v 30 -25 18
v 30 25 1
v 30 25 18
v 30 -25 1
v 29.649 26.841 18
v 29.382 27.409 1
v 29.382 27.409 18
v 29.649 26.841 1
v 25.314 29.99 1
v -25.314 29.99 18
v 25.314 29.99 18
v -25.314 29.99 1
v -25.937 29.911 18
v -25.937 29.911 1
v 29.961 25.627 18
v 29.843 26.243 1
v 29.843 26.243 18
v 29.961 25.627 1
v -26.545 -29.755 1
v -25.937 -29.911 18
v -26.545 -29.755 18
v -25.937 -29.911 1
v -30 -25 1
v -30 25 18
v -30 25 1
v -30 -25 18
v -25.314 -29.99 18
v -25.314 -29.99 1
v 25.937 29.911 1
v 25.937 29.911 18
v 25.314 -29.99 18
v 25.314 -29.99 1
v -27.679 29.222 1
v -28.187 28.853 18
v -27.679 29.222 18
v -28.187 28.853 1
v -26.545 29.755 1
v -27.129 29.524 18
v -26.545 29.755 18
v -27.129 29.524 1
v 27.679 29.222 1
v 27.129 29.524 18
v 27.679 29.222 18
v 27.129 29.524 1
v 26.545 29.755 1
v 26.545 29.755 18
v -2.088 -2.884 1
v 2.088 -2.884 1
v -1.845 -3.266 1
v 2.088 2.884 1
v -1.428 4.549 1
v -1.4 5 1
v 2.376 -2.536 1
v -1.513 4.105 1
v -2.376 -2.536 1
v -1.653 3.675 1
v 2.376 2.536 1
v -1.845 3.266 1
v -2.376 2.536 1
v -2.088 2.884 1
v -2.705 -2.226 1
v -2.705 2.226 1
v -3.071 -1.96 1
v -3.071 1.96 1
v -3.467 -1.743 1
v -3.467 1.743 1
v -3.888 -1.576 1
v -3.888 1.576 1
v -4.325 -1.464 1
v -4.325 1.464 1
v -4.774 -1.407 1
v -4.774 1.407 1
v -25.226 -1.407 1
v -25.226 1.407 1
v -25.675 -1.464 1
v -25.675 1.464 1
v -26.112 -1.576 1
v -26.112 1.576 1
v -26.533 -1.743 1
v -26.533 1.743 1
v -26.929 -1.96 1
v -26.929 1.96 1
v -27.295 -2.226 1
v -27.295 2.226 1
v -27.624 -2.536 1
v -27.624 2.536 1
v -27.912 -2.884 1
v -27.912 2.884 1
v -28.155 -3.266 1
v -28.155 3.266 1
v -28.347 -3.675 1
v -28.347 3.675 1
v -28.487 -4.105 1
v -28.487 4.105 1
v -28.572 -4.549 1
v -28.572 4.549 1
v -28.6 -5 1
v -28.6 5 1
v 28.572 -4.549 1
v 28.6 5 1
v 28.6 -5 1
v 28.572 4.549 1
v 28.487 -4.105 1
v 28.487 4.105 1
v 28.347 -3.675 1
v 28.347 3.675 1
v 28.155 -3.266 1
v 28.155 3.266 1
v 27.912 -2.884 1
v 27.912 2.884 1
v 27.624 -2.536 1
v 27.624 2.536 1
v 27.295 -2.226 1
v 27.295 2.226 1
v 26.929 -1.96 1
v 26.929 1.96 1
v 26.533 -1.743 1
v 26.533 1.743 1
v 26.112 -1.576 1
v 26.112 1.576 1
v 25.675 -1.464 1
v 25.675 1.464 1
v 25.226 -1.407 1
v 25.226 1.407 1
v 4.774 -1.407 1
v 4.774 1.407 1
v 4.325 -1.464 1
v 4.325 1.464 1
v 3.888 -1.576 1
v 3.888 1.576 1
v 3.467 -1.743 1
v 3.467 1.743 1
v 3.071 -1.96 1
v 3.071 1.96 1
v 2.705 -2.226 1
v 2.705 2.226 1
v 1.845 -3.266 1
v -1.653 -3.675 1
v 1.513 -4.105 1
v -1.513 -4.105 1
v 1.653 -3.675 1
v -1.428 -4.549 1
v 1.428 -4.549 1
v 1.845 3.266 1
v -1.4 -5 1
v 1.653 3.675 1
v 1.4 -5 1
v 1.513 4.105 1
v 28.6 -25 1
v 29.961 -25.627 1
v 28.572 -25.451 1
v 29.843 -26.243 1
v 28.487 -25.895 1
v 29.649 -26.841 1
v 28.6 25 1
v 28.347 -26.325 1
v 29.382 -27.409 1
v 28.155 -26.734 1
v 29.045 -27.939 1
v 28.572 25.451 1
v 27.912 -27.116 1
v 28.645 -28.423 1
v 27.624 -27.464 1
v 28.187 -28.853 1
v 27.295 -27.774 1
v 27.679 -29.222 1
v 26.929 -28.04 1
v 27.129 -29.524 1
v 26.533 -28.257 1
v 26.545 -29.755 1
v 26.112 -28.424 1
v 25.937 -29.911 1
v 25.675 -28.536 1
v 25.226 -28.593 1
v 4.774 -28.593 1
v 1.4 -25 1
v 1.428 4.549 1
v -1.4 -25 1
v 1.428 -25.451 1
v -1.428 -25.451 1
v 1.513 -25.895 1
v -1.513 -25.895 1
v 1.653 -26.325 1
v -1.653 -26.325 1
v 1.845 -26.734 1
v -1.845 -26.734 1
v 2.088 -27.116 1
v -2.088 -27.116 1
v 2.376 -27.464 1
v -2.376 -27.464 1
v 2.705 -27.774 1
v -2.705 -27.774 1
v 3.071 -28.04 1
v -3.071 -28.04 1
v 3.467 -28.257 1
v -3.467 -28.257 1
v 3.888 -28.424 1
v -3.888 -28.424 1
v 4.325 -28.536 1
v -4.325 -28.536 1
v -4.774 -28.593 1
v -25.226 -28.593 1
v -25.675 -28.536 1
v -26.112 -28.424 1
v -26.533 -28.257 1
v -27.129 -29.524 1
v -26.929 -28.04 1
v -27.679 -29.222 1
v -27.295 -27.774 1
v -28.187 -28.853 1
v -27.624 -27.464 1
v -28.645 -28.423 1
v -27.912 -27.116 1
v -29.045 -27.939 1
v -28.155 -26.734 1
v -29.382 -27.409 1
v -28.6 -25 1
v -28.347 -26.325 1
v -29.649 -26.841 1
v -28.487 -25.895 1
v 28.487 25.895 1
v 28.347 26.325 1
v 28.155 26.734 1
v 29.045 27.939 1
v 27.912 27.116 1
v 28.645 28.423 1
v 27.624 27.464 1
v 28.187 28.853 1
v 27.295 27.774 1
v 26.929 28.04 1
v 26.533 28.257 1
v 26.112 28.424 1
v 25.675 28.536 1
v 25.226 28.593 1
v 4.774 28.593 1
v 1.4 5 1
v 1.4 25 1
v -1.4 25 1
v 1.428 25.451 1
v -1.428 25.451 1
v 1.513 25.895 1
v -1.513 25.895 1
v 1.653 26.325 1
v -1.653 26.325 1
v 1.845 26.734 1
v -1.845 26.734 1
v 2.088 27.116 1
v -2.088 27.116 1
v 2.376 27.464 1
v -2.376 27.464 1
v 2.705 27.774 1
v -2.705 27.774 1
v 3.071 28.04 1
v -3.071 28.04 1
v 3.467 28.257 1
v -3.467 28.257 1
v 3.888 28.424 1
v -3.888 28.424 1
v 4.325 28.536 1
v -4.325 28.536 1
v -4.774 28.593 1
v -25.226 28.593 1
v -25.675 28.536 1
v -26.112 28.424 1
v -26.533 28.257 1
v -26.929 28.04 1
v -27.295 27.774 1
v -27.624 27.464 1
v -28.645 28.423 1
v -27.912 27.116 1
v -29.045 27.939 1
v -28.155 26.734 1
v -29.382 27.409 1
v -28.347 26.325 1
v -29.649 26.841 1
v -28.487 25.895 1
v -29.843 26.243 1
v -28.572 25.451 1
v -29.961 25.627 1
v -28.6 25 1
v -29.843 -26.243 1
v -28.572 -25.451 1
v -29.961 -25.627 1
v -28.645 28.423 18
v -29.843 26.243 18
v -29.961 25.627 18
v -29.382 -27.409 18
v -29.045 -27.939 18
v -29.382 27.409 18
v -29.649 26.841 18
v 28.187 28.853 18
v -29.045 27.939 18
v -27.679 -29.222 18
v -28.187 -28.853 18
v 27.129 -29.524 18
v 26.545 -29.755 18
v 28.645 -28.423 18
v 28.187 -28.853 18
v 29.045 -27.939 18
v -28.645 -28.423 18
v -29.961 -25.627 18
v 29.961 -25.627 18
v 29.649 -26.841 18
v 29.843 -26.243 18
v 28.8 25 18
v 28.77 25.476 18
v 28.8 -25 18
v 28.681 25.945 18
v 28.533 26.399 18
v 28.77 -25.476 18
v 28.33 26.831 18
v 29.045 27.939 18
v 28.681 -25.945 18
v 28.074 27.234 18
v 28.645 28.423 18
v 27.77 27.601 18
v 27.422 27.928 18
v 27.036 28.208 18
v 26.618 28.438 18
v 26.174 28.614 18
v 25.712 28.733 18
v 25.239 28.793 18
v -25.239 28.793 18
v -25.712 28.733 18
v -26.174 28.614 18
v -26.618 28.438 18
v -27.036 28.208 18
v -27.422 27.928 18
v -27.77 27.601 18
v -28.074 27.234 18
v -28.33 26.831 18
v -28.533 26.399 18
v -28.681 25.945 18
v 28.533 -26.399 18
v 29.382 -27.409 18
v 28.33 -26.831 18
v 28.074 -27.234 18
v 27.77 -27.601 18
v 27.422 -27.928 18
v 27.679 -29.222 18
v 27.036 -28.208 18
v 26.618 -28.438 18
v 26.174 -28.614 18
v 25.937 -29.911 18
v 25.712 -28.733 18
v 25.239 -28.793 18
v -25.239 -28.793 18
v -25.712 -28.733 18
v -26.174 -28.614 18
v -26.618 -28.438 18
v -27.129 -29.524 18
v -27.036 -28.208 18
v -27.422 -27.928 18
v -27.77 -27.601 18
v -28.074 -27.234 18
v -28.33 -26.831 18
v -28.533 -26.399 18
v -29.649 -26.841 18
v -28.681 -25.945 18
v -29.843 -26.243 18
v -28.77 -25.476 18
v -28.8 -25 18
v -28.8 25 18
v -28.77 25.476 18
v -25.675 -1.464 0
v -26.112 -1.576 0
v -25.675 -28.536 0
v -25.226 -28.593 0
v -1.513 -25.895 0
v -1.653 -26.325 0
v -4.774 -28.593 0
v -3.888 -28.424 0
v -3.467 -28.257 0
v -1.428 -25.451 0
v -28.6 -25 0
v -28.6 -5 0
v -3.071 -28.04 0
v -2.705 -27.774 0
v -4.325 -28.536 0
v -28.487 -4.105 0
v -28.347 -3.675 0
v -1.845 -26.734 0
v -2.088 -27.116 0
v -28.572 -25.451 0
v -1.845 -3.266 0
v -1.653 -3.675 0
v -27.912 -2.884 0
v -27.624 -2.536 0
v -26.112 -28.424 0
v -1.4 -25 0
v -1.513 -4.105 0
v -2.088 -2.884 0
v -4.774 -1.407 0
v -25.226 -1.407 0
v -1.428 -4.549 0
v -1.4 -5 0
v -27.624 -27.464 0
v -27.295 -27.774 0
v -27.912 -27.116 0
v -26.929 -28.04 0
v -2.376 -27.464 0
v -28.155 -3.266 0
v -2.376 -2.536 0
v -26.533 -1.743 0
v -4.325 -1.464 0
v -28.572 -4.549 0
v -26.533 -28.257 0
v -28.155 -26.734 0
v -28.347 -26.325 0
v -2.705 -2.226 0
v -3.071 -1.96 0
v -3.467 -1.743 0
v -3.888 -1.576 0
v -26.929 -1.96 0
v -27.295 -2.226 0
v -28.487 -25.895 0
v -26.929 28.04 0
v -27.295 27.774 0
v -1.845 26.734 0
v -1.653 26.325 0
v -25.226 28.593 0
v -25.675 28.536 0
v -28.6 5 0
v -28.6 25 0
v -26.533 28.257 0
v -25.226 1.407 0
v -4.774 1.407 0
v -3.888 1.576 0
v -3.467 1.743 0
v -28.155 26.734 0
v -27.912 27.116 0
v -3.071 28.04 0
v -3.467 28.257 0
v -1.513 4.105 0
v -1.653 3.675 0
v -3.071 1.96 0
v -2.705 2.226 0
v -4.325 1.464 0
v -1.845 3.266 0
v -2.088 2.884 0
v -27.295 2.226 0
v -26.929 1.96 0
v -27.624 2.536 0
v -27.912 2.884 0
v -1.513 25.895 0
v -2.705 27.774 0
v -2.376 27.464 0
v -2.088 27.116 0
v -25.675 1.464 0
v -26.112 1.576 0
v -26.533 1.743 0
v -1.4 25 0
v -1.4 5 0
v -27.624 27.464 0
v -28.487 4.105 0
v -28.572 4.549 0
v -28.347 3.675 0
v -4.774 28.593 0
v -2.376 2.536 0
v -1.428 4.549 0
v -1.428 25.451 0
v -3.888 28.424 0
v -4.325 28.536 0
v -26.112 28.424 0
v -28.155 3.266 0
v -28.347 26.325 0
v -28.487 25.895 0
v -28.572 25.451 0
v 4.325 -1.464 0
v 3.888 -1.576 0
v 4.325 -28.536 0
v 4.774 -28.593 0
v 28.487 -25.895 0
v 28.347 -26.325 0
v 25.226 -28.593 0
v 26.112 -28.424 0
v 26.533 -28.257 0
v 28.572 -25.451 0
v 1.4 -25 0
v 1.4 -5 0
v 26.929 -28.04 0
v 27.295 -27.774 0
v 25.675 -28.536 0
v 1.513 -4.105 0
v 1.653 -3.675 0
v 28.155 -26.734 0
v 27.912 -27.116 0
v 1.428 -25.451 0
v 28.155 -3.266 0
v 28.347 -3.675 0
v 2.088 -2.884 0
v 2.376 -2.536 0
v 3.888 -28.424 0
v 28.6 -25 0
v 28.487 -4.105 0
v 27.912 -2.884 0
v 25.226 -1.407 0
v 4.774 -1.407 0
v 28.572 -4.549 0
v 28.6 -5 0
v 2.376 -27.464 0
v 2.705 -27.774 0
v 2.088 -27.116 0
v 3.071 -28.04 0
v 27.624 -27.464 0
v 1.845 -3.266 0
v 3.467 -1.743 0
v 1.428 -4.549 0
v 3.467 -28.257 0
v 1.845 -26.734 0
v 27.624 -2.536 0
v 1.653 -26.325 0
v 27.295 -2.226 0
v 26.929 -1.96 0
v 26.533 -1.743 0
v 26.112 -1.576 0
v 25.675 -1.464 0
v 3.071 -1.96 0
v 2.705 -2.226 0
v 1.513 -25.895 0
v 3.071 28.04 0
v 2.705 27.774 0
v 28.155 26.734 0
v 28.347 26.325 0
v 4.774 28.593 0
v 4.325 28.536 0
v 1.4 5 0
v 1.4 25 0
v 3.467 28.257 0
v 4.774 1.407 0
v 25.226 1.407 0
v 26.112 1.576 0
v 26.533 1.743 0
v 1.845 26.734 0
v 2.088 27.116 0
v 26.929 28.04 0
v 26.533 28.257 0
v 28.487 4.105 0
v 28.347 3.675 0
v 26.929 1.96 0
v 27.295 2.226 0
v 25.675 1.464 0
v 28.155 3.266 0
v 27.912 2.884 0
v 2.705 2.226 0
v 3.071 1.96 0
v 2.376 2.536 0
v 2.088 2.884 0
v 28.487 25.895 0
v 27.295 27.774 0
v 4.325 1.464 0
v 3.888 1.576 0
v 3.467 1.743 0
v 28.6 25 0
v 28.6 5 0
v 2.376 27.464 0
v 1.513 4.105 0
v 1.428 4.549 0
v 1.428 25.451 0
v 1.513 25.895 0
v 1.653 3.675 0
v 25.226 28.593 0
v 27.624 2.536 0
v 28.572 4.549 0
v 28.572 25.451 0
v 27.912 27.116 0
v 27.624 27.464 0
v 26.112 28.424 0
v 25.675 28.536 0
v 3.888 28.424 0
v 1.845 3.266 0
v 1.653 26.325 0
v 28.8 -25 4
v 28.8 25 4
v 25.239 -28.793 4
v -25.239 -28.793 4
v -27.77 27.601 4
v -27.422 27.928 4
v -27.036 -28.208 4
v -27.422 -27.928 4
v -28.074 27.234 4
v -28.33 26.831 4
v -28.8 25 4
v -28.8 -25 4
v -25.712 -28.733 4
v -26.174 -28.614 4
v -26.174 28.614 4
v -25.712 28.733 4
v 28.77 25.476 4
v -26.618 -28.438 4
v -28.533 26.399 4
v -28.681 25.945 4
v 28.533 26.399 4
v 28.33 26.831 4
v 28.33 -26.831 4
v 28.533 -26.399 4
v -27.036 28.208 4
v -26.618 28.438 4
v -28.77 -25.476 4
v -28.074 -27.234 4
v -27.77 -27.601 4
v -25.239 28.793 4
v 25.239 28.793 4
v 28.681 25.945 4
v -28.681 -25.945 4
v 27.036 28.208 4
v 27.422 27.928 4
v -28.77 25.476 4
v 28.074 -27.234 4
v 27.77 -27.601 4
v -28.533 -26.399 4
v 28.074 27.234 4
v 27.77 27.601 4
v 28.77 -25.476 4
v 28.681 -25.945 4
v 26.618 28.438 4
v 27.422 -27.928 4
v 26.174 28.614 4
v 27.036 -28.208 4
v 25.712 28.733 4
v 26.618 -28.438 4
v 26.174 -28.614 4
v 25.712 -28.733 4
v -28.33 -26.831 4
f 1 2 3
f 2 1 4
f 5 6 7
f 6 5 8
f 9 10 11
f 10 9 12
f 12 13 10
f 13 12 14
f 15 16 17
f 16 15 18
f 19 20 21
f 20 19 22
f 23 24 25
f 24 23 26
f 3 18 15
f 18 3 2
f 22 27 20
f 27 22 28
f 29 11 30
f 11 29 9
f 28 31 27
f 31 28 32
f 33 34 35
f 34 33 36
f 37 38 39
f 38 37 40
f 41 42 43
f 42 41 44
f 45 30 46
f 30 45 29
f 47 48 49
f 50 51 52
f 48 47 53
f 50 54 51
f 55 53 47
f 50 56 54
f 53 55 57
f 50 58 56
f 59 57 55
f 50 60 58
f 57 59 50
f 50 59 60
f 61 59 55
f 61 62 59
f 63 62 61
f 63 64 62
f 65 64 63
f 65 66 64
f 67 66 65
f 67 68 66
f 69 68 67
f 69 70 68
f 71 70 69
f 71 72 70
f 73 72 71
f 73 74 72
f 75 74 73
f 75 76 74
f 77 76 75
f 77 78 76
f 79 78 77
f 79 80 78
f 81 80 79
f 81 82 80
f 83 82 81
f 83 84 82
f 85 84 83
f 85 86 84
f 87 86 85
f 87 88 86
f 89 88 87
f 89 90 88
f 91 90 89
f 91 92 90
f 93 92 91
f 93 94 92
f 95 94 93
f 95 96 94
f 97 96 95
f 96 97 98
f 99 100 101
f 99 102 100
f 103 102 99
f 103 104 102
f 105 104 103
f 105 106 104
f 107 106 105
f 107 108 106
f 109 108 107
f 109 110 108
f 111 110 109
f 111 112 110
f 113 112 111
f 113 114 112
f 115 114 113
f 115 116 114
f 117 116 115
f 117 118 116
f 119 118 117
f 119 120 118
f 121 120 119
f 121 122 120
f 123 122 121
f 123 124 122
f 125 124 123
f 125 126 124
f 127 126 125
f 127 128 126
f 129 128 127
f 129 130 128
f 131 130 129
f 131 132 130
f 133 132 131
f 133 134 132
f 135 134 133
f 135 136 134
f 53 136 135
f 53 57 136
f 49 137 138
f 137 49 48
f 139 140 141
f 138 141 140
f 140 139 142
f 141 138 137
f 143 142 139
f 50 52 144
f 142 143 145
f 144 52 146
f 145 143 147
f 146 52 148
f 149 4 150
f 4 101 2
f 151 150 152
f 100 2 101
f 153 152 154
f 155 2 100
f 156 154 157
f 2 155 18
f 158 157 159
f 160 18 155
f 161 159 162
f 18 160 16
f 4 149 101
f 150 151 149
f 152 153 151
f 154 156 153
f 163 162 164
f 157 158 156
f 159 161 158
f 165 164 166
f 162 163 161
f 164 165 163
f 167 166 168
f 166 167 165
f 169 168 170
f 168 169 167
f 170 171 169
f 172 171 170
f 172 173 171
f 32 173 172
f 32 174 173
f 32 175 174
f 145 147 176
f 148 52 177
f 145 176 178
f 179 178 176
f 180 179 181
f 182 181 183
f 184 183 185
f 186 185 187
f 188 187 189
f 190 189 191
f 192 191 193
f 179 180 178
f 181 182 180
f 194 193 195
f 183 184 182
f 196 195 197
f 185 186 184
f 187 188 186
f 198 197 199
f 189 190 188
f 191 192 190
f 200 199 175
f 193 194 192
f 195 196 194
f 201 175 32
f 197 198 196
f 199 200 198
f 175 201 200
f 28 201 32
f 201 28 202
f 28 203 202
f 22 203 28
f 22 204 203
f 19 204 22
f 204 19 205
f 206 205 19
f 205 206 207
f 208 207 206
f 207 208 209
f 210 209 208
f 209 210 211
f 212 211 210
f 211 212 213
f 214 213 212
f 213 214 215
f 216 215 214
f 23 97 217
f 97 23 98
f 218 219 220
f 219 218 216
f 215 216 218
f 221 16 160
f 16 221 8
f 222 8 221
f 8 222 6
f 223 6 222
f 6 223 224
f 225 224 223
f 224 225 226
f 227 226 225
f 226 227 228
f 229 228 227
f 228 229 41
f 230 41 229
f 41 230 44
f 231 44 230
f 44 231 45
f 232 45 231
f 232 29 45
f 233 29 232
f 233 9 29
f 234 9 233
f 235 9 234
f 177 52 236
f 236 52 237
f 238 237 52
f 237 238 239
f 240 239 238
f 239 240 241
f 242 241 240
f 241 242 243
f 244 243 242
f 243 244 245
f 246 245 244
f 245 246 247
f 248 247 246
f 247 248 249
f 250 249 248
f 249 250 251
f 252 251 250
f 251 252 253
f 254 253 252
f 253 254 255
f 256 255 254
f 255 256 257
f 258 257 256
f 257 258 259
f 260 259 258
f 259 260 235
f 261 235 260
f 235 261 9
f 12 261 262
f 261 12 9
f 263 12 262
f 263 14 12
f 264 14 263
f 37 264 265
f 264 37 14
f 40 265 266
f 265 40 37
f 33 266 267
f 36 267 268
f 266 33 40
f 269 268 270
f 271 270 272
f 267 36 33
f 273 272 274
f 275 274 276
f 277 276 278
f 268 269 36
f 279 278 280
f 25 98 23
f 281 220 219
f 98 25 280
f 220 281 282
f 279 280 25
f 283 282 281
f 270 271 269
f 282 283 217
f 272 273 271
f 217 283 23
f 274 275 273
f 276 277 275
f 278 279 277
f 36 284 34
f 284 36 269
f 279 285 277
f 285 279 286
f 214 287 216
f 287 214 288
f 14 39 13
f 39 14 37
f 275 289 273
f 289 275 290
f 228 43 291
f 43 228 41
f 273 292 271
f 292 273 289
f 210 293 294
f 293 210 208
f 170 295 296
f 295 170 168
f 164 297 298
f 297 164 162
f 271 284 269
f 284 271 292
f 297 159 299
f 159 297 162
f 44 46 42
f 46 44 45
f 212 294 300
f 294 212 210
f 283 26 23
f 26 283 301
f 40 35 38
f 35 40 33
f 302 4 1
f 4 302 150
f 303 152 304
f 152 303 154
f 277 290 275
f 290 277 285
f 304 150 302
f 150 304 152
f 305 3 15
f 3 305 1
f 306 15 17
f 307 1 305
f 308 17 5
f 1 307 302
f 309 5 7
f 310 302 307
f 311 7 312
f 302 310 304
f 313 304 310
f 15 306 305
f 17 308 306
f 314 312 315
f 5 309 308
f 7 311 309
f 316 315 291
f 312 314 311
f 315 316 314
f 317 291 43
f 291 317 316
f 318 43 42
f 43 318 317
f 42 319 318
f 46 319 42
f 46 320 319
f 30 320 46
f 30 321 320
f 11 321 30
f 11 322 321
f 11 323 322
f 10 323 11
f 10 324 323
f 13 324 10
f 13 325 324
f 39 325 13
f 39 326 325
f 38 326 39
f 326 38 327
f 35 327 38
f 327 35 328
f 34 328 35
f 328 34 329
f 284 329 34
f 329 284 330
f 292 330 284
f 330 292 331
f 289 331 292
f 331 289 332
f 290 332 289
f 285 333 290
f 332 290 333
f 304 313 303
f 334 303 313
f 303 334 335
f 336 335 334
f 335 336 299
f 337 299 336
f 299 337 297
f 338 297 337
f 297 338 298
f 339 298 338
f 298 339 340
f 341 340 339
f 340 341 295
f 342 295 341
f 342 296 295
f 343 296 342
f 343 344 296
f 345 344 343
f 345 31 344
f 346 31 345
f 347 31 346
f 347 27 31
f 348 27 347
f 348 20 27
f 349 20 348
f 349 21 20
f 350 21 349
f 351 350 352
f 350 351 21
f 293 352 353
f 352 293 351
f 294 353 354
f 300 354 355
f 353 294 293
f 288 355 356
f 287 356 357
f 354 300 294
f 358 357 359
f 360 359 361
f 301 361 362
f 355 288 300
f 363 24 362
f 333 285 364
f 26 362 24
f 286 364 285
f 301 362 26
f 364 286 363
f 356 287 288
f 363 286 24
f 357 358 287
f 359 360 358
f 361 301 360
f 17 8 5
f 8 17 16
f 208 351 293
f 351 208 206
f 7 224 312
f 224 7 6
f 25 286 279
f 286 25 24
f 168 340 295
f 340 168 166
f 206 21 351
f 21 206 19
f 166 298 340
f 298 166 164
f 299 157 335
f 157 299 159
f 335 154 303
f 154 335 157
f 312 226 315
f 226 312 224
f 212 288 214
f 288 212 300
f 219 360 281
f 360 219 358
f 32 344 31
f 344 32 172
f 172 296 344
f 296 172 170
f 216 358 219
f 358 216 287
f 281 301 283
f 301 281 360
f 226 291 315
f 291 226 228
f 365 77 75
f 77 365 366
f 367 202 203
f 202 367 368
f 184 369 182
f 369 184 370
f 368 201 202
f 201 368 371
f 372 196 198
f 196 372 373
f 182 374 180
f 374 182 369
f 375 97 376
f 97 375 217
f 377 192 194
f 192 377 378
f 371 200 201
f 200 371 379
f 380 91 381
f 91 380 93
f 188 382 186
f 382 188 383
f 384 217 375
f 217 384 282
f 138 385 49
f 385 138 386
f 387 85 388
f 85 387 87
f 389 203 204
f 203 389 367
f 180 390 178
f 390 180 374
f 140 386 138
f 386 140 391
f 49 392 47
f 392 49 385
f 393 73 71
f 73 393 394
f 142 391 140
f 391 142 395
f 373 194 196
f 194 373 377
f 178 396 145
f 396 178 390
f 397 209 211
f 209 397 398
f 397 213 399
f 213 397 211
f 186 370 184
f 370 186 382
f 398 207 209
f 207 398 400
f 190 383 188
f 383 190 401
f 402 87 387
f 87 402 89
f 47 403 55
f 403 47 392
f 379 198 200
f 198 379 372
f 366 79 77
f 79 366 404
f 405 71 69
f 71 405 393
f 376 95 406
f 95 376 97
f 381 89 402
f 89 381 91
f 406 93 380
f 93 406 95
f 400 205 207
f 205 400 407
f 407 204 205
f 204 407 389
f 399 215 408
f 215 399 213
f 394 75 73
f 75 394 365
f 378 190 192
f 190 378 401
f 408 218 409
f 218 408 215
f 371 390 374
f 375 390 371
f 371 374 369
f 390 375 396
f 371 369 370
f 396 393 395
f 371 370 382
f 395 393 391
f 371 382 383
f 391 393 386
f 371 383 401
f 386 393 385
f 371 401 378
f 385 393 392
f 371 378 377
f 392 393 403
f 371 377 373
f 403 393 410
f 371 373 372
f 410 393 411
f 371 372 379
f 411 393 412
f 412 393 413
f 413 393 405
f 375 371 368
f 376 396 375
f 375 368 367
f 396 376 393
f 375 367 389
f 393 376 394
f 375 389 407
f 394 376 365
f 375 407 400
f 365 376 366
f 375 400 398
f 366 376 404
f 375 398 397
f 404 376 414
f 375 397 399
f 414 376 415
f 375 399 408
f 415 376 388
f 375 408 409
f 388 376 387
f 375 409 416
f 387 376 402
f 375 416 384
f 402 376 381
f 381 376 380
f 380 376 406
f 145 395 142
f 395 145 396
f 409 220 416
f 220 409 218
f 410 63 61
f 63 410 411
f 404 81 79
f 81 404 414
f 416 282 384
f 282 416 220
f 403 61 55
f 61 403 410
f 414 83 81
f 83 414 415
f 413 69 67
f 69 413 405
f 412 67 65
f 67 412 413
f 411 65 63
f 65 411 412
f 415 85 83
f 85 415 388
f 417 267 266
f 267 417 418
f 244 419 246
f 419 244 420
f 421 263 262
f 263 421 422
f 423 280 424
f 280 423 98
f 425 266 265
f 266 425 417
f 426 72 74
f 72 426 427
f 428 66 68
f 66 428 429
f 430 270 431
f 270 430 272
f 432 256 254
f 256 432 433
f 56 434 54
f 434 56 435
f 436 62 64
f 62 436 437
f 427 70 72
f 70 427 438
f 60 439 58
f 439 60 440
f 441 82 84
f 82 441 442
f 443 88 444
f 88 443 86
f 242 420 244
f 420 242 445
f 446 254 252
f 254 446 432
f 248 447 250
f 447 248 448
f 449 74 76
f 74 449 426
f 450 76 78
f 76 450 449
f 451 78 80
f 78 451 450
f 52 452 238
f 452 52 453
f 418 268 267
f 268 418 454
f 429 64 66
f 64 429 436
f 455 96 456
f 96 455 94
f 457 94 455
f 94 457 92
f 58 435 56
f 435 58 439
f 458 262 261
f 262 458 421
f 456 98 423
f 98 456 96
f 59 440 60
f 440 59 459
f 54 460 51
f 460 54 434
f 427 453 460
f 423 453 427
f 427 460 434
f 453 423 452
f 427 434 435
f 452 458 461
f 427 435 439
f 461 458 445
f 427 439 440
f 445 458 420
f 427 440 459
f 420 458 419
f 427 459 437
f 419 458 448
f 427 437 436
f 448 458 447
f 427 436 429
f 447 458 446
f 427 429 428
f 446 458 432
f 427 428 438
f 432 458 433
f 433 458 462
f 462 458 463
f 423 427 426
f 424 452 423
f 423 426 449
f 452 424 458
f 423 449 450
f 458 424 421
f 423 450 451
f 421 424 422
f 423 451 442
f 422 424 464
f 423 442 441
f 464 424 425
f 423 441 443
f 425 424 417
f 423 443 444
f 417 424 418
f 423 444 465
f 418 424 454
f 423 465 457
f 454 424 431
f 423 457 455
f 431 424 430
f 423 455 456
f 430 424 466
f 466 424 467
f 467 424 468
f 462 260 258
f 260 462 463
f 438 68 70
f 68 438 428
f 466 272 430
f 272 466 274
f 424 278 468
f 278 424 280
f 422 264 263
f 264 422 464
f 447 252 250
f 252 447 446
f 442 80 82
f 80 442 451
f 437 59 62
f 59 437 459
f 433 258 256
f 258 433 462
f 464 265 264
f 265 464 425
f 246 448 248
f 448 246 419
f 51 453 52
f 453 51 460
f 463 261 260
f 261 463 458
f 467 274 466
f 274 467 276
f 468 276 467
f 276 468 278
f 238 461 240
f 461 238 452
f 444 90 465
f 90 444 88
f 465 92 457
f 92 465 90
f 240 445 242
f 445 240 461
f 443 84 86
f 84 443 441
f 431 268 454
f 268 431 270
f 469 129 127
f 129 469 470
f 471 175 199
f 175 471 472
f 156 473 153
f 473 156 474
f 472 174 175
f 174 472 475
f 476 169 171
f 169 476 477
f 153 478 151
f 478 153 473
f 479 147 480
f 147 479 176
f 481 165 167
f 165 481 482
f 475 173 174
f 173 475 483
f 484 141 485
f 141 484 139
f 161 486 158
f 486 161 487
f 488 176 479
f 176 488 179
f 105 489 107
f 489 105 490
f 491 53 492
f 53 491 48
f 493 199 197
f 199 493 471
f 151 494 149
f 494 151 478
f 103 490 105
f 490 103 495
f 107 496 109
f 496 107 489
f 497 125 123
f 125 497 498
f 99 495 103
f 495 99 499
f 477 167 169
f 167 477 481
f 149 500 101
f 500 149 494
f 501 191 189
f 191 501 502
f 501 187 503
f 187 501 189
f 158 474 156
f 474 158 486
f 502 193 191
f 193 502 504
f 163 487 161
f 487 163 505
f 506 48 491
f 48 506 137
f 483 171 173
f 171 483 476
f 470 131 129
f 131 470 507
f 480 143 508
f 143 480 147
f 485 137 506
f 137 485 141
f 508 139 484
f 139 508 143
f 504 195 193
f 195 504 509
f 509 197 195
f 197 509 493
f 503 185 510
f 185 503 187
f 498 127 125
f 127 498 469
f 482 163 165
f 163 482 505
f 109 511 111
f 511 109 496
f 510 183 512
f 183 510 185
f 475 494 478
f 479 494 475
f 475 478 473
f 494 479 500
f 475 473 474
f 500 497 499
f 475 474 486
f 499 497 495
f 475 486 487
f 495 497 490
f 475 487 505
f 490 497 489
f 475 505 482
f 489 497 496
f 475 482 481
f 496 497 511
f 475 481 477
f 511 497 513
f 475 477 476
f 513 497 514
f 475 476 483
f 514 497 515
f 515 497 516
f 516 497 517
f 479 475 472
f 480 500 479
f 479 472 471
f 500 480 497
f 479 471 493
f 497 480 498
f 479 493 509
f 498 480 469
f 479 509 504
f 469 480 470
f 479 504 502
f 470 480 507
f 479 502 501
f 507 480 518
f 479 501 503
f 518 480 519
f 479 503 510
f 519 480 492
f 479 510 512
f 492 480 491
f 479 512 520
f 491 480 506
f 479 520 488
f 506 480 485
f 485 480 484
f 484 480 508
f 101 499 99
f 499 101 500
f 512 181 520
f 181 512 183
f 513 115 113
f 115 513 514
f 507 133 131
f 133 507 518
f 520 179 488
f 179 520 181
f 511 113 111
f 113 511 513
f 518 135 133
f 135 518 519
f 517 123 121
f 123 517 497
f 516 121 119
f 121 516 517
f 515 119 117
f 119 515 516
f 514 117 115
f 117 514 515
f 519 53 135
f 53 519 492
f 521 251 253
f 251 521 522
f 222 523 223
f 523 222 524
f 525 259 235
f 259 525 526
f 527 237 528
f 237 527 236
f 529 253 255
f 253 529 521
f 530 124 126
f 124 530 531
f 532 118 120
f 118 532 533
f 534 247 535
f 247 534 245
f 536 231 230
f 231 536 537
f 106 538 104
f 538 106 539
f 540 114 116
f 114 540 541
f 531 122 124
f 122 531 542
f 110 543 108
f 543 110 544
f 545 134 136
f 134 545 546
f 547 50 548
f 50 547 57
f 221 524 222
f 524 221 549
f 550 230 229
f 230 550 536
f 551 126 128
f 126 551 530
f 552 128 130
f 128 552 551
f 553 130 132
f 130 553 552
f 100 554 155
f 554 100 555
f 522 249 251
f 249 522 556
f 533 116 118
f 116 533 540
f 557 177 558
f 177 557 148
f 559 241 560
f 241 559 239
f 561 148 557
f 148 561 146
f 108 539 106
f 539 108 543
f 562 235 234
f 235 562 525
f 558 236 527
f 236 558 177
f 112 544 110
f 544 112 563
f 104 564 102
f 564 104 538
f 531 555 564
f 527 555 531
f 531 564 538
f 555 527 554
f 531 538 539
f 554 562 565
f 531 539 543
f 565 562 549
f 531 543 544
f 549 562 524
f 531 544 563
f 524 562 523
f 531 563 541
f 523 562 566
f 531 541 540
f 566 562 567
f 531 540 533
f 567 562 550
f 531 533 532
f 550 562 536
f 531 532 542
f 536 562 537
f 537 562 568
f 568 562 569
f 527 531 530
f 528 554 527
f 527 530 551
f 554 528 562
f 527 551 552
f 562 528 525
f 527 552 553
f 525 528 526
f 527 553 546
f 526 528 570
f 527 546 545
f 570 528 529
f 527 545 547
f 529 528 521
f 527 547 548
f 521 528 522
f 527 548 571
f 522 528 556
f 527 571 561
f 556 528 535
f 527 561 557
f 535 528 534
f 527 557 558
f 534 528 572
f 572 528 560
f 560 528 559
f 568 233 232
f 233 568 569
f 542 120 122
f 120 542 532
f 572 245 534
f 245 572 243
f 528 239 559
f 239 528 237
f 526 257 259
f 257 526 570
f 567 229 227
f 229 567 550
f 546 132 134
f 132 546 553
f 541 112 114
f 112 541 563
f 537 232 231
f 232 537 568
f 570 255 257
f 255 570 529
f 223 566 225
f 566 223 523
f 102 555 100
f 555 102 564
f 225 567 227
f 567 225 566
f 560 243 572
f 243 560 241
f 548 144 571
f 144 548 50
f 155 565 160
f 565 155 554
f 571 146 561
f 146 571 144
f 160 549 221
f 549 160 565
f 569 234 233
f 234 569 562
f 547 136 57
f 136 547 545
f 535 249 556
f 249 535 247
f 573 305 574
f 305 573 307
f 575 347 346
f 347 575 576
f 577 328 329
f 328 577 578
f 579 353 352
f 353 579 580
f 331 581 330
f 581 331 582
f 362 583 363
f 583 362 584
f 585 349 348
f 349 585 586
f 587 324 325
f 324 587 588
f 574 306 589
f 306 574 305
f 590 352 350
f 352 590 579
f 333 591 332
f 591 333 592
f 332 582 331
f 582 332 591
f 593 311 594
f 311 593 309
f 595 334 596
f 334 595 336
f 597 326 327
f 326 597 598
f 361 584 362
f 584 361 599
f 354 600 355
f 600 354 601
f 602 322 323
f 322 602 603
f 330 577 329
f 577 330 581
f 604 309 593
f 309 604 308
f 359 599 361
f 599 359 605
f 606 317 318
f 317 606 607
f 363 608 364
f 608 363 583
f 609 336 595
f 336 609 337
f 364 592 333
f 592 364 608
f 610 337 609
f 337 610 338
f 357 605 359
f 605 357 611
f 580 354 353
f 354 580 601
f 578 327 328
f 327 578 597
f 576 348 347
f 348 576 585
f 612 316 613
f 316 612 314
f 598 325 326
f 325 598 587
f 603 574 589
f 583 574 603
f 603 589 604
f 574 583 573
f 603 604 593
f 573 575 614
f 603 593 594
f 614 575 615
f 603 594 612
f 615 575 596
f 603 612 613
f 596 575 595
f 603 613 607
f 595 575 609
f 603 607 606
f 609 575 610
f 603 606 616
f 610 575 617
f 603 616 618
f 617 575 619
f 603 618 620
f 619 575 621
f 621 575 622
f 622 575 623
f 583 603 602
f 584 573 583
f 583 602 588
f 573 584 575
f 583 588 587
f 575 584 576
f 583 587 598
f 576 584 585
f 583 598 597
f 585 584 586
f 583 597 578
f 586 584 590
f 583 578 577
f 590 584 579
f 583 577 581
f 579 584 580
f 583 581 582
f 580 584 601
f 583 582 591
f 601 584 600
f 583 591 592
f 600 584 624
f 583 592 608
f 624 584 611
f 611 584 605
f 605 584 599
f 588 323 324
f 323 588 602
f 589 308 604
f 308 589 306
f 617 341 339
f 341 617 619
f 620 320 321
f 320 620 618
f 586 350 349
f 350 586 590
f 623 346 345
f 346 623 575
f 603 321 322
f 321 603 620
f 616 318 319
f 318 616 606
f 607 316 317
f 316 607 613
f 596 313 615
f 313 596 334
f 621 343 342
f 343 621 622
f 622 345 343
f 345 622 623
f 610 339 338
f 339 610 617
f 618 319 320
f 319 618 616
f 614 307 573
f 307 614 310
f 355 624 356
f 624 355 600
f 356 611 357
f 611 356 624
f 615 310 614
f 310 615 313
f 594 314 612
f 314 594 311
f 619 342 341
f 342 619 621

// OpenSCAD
$fn = 50;


difference() {
	union() {
		translate(v = [0, 0, 1]) {
			hull() {
				translate(v = [-25.0000000000, 25.0000000000, 0]) {
					cylinder(h = 17, r = 5);
				}
				translate(v = [25.0000000000, 25.0000000000, 0]) {
					cylinder(h = 17, r = 5);
				}
				translate(v = [-25.0000000000, -25.0000000000, 0]) {
					cylinder(h = 17, r = 5);
				}
				translate(v = [25.0000000000, -25.0000000000, 0]) {
					cylinder(h = 17, r = 5);
				}
			}
		}
		translate(v = [-15.0000000000, -15.0000000000, 11]) {
			rotate(a = [0, 180, 0]) {
				hull() {
					translate(v = [-10.0000000000, 10.0000000000, 0]) {
						cylinder(h = 11, r = 3.6000000000);
					}
					translate(v = [10.0000000000, 10.0000000000, 0]) {
						cylinder(h = 11, r = 3.6000000000);
					}
					translate(v = [-10.0000000000, -10.0000000000, 0]) {
						cylinder(h = 11, r = 3.6000000000);
					}
					translate(v = [10.0000000000, -10.0000000000, 0]) {
						cylinder(h = 11, r = 3.6000000000);
					}
				}
			}
		}
		translate(v = [-15.0000000000, -15.0000000000, 13]) {
			rotate(a = [0, 180, 0]) {
				hull() {
					translate(v = [-10.0000000000, 10.0000000000, 0]) {
						cylinder(h = 2, r = 3.6000000000);
					}
					translate(v = [10.0000000000, 10.0000000000, 0]) {
						cylinder(h = 2, r = 3.6000000000);
					}
					translate(v = [-10.0000000000, -10.0000000000, 0]) {
						cylinder(h = 2, r = 3.6000000000);
					}
					translate(v = [10.0000000000, -10.0000000000, 0]) {
						cylinder(h = 2, r = 3.6000000000);
					}
				}
			}
		}
		translate(v = [-15.0000000000, 15.0000000000, 11]) {
			rotate(a = [0, 180, 0]) {
				hull() {
					translate(v = [-10.0000000000, 10.0000000000, 0]) {
						cylinder(h = 11, r = 3.6000000000);
					}
					translate(v = [10.0000000000, 10.0000000000, 0]) {
						cylinder(h = 11, r = 3.6000000000);
					}
					translate(v = [-10.0000000000, -10.0000000000, 0]) {
						cylinder(h = 11, r = 3.6000000000);
					}
					translate(v = [10.0000000000, -10.0000000000, 0]) {
						cylinder(h = 11, r = 3.6000000000);
					}
				}
			}
		}
		translate(v = [-15.0000000000, 15.0000000000, 13]) {
			rotate(a = [0, 180, 0]) {
				hull() {
					translate(v = [-10.0000000000, 10.0000000000, 0]) {
						cylinder(h = 2, r = 3.6000000000);
					}
					translate(v = [10.0000000000, 10.0000000000, 0]) {
						cylinder(h = 2, r = 3.6000000000);
					}
					translate(v = [-10.0000000000, -10.0000000000, 0]) {
						cylinder(h = 2, r = 3.6000000000);
					}
					translate(v = [10.0000000000, -10.0000000000, 0]) {
						cylinder(h = 2, r = 3.6000000000);
					}
				}
			}
		}
		translate(v = [15.0000000000, -15.0000000000, 11]) {
			rotate(a = [0, 180, 0]) {
				hull() {
					translate(v = [-10.0000000000, 10.0000000000, 0]) {
						cylinder(h = 11, r = 3.6000000000);
					}
					translate(v = [10.0000000000, 10.0000000000, 0]) {
						cylinder(h = 11, r = 3.6000000000);
					}
					translate(v = [-10.0000000000, -10.0000000000, 0]) {
						cylinder(h = 11, r = 3.6000000000);
					}
					translate(v = [10.0000000000, -10.0000000000, 0]) {
						cylinder(h = 11, r = 3.6000000000);
					}
				}
			}
		}
		translate(v = [15.0000000000, -15.0000000000, 13]) {
			rotate(a = [0, 180, 0]) {
				hull() {
					translate(v = [-10.0000000000, 10.0000000000, 0]) {
						cylinder(h = 2, r = 3.6000000000);
					}
					translate(v = [10.0000000000, 10.0000000000, 0]) {
						cylinder(h = 2, r = 3.6000000000);
					}
					translate(v = [-10.0000000000, -10.0000000000, 0]) {
						cylinder(h = 2, r = 3.6000000000);
					}
					translate(v = [10.0000000000, -10.0000000000, 0]) {
						cylinder(h = 2, r = 3.6000000000);
					}
				}
			}
		}
		translate(v = [15.0000000000, 15.0000000000, 11]) {
			rotate(a = [0, 180, 0]) {
				hull() {
					translate(v = [-10.0000000000, 10.0000000000, 0]) {
						cylinder(h = 11, r = 3.6000000000);
					}
					translate(v = [10.0000000000, 10.0000000000, 0]) {
						cylinder(h = 11, r = 3.6000000000);
					}
					translate(v = [-10.0000000000, -10.0000000000, 0]) {
						cylinder(h = 11, r = 3.6000000000);
					}
					translate(v = [10.0000000000, -10.0000000000, 0]) {
						cylinder(h = 11, r = 3.6000000000);
					}
				}
			}
		}
		translate(v = [15.0000000000, 15.0000000000, 13]) {
			rotate(a = [0, 180, 0]) {
				hull() {
					translate(v = [-10.0000000000, 10.0000000000, 0]) {
						cylinder(h = 2, r = 3.6000000000);
					}
					translate(v = [10.0000000000, 10.0000000000, 0]) {
						cylinder(h = 2, r = 3.6000000000);
					}
					translate(v = [-10.0000000000, -10.0000000000, 0]) {
						cylinder(h = 2, r = 3.6000000000);
					}
					translate(v = [10.0000000000, -10.0000000000, 0]) {
						cylinder(h = 2, r = 3.6000000000);
					}
				}
			}
		}
	}
	union() {
		translate(v = [0, 0, 4]) {
			hull() {
				translate(v = [-25.0000000000, 25.0000000000, 0]) {
					cylinder(h = 14, r = 3.8000000000);
				}
				translate(v = [25.0000000000, 25.0000000000, 0]) {
					cylinder(h = 14, r = 3.8000000000);
				}
				translate(v = [-25.0000000000, -25.0000000000, 0]) {
					cylinder(h = 14, r = 3.8000000000);
				}
				translate(v = [25.0000000000, -25.0000000000, 0]) {
					cylinder(h = 14, r = 3.8000000000);
				}
			}
		}
		translate(v = [-15.0000000000, -15.0000000000, 14.5000000000]) {
			rotate(a = [0, 180, 0]) {
				hull() {
					translate(v = [-10.0000000000, 10.0000000000, 0]) {
						cylinder(h = 3.0000000000, r = 2.4000000000);
					}
					translate(v = [10.0000000000, 10.0000000000, 0]) {
						cylinder(h = 3.0000000000, r = 2.4000000000);
					}
					translate(v = [-10.0000000000, -10.0000000000, 0]) {
						cylinder(h = 3.0000000000, r = 2.4000000000);
					}
					translate(v = [10.0000000000, -10.0000000000, 0]) {
						cylinder(h = 3.0000000000, r = 2.4000000000);
					}
				}
			}
		}
		translate(v = [-15.0000000000, 15.0000000000, 14.5000000000]) {
			rotate(a = [0, 180, 0]) {
				hull() {
					translate(v = [-10.0000000000, 10.0000000000, 0]) {
						cylinder(h = 3.0000000000, r = 2.4000000000);
					}
					translate(v = [10.0000000000, 10.0000000000, 0]) {
						cylinder(h = 3.0000000000, r = 2.4000000000);
					}
					translate(v = [-10.0000000000, -10.0000000000, 0]) {
						cylinder(h = 3.0000000000, r = 2.4000000000);
					}
					translate(v = [10.0000000000, -10.0000000000, 0]) {
						cylinder(h = 3.0000000000, r = 2.4000000000);
					}
				}
			}
		}
		translate(v = [15.0000000000, -15.0000000000, 14.5000000000]) {
			rotate(a = [0, 180, 0]) {
				hull() {
					translate(v = [-10.0000000000, 10.0000000000, 0]) {
						cylinder(h = 3.0000000000, r = 2.4000000000);
					}
					translate(v = [10.0000000000, 10.0000000000, 0]) {
						cylinder(h = 3.0000000000, r = 2.4000000000);
					}
					translate(v = [-10.0000000000, -10.0000000000, 0]) {
						cylinder(h = 3.0000000000, r = 2.4000000000);
					}
					translate(v = [10.0000000000, -10.0000000000, 0]) {
						cylinder(h = 3.0000000000, r = 2.4000000000);
					}
				}
			}
		}
		translate(v = [15.0000000000, 15.0000000000, 14.5000000000]) {
			rotate(a = [0, 180, 0]) {
				hull() {
					translate(v = [-10.0000000000, 10.0000000000, 0]) {
						cylinder(h = 3.0000000000, r = 2.4000000000);
					}
					translate(v = [10.0000000000, 10.0000000000, 0]) {
						cylinder(h = 3.0000000000, r = 2.4000000000);
					}
					translate(v = [-10.0000000000, -10.0000000000, 0]) {
						cylinder(h = 3.0000000000, r = 2.4000000000);
					}
					translate(v = [10.0000000000, -10.0000000000, 0]) {
						cylinder(h = 3.0000000000, r = 2.4000000000);
					}
				}
			}
		}
	}
}
